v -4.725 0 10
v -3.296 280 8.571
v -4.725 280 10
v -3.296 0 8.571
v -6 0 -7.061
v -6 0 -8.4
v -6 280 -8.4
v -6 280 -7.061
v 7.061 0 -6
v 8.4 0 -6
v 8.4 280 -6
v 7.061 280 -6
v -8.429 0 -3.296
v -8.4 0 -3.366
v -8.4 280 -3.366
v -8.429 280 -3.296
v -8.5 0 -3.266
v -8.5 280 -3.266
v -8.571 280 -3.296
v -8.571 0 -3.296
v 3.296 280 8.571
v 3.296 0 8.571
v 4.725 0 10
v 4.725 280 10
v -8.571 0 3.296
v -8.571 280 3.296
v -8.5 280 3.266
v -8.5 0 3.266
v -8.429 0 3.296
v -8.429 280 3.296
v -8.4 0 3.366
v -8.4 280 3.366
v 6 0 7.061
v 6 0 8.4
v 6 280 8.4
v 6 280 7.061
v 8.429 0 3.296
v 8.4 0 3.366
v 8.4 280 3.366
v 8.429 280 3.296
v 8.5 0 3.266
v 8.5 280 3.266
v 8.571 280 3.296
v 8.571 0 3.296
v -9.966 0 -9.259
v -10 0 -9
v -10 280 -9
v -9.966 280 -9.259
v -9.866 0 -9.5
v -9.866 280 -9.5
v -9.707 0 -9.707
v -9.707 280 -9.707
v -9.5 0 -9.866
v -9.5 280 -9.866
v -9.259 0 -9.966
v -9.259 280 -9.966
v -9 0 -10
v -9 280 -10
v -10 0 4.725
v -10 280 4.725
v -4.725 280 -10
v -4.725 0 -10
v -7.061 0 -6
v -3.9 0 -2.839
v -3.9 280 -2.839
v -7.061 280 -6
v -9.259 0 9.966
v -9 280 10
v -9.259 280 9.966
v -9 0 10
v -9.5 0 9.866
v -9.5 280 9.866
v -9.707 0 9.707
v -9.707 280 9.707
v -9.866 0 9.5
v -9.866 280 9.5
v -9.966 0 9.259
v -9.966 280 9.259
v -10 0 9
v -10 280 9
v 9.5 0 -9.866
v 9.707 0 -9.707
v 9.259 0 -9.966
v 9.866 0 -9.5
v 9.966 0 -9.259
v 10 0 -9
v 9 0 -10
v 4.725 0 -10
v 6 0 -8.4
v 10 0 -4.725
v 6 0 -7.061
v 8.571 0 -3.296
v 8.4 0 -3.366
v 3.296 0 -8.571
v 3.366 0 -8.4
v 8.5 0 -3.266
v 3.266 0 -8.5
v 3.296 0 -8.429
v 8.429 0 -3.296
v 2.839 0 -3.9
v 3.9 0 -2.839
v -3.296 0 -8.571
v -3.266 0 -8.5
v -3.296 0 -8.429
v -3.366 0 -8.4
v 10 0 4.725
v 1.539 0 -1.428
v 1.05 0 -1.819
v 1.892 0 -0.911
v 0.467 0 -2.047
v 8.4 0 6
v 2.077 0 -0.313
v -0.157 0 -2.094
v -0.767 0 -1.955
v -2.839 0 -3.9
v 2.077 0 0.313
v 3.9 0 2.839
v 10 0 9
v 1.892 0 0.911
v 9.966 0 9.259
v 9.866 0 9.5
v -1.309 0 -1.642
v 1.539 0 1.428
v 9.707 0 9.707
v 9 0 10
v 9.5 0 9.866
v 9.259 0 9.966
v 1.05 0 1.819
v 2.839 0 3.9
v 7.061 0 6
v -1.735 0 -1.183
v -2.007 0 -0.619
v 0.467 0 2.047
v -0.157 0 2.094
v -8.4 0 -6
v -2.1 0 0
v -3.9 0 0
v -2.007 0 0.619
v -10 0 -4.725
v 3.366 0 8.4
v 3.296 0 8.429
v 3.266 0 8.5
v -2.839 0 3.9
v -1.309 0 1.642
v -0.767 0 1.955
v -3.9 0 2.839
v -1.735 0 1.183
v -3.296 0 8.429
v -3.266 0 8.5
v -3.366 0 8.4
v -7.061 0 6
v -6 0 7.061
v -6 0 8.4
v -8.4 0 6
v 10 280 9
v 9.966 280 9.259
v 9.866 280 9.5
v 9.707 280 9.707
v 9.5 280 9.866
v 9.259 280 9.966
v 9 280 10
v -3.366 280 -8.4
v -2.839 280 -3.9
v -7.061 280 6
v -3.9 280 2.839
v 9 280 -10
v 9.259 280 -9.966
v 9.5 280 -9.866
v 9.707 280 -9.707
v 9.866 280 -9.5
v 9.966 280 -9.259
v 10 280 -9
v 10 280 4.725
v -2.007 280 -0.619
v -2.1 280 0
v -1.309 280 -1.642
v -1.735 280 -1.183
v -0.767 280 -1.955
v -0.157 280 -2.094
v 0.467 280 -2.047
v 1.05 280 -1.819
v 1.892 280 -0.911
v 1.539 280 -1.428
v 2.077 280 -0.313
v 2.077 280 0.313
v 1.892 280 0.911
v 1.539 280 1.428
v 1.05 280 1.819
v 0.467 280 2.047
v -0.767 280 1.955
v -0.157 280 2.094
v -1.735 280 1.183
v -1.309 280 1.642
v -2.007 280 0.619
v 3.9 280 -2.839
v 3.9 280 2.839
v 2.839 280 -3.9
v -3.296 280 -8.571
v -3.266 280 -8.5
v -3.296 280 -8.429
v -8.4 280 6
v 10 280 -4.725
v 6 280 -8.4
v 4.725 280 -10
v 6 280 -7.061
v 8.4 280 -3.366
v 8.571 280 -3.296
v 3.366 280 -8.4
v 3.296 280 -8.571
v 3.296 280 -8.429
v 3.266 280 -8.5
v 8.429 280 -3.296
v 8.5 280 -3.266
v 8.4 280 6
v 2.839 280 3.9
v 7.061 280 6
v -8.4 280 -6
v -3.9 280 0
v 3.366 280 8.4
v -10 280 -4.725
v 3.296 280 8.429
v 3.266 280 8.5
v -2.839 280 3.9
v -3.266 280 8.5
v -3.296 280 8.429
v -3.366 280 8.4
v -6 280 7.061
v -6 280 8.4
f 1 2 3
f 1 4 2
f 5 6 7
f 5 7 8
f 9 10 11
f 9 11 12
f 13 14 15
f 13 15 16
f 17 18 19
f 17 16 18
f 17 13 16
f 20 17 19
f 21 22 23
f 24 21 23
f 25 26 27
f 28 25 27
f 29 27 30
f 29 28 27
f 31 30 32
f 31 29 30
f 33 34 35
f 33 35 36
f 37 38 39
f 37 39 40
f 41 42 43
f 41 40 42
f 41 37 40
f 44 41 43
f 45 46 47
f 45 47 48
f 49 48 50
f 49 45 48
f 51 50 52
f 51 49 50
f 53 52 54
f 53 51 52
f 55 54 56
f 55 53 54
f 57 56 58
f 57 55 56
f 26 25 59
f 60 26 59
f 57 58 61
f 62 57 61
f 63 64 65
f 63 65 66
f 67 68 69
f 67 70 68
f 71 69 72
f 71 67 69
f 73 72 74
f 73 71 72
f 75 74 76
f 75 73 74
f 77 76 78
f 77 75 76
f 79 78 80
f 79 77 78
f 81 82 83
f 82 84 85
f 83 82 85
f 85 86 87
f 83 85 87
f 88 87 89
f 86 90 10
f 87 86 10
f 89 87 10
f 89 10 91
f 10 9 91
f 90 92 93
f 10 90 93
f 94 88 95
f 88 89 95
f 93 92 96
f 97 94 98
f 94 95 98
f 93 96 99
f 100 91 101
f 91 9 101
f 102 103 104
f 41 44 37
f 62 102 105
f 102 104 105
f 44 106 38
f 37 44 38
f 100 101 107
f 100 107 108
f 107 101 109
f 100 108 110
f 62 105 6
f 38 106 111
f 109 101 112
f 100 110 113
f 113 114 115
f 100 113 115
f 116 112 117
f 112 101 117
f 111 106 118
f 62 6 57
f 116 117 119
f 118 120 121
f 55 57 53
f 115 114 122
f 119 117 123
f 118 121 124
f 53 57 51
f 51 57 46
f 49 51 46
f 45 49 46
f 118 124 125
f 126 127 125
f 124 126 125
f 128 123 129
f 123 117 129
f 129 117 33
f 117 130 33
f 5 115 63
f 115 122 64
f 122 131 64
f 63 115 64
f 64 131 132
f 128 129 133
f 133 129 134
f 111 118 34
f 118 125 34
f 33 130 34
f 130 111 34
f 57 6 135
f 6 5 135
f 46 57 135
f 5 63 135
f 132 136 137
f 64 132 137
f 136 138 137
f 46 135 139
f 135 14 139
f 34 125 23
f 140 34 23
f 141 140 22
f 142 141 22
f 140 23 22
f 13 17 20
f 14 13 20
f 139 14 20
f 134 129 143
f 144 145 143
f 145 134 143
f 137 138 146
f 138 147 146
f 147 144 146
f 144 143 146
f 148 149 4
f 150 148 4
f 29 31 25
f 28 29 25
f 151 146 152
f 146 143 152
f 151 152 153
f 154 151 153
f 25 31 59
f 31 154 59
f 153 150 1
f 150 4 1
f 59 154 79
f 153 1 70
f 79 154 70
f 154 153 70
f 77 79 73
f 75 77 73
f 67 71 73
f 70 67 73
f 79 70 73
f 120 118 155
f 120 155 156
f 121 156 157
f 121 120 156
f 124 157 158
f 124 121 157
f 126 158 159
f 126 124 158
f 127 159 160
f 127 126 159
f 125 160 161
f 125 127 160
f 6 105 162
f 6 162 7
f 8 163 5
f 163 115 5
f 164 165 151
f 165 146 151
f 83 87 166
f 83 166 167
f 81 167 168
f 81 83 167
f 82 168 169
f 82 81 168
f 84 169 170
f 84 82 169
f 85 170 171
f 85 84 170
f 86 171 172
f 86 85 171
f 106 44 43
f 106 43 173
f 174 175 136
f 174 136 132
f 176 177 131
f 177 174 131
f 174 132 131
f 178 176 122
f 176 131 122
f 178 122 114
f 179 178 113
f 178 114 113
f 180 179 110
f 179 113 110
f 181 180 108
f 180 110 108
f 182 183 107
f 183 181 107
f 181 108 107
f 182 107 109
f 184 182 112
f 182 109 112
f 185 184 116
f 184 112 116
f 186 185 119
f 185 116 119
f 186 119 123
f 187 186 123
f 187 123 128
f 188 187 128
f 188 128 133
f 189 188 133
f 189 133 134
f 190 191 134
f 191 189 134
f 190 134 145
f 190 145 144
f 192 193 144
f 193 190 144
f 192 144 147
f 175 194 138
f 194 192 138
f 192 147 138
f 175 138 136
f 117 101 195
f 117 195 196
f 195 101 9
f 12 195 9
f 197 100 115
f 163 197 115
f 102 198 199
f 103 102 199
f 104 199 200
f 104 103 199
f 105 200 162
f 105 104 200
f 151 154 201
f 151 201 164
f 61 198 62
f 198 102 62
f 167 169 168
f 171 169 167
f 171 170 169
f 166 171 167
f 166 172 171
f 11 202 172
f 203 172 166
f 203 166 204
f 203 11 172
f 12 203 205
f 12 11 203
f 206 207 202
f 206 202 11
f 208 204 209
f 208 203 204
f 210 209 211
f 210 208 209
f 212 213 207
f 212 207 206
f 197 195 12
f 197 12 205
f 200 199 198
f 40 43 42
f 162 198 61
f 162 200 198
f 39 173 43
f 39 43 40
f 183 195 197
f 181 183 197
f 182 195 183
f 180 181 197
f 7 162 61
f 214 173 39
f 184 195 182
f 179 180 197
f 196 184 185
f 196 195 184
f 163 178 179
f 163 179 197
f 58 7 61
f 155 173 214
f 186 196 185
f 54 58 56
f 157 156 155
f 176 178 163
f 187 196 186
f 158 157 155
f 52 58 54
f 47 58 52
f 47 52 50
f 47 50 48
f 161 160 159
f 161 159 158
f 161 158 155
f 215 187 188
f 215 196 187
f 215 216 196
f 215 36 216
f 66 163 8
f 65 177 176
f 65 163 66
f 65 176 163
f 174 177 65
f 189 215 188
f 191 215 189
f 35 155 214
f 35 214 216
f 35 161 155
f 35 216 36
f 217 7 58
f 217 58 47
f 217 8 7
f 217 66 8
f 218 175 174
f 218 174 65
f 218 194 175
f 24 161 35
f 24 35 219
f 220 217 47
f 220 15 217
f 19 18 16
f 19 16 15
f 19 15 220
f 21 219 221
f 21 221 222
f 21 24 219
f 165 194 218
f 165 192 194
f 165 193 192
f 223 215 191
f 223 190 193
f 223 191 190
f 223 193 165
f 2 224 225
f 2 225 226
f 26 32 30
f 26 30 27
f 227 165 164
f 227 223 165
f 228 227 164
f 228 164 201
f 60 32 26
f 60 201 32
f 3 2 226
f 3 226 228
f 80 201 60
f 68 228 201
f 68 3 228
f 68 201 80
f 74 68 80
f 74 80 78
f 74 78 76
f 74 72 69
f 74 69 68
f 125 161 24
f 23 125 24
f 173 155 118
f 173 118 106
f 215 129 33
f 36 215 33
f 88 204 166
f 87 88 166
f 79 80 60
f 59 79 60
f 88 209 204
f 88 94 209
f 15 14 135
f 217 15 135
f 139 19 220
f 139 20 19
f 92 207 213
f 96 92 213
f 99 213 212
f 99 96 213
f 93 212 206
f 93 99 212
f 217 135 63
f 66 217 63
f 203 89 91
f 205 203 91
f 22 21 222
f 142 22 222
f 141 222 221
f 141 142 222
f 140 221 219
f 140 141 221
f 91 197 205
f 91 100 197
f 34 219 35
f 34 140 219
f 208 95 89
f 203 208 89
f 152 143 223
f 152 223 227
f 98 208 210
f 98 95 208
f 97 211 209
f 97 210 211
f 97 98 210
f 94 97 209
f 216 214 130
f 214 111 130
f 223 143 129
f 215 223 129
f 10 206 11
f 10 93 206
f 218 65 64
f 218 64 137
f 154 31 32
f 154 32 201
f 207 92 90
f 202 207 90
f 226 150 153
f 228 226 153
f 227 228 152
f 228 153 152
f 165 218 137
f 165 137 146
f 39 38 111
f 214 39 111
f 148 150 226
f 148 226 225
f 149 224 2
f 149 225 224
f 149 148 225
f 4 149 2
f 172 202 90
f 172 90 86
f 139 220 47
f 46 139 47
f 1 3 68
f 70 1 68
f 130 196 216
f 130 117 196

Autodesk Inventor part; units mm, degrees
ref_plane "YZ Plane" through (0, 0, 0) normal (1, 0, 0) x (0, 1, 0)
ref_plane "XZ Plane" through (0, 0, 0) normal (0, 1, 0) x (-1, 0, 0)
ref_plane "XY Plane" through (0, 0, 0) normal (0, 0, 1) x (1, 0, 0)
sketch "Sketch1" plane through (0, 0, 0) normal (0, 1, 0) x (-1, 0, 0)
  line L0 (3.9, -2.8393) -> (3.9, 2.8393)
  line L1 (2.8393, 3.9) -> (-2.8393, 3.9)
  line L2 (-2.8393, -3.9) -> (2.8393, -3.9)
  line L3 (8.5707, 3.2957) -> (10, 4.725)
  line L4 (8.5707, -3.2957) -> (10, -4.725)
  line L5 (8.4, 3.3664) -> (8.4, 6)
  line L6 (8.4, 6) -> (7.0607, 6)
  line L7 (10, 9) -> (10, 4.725)
  line L8 (10, -4.725) -> (10, -9)
  line L9 (3.9, 2.8393) -> (7.0607, 6)
  line L10 (3.2957, 8.5707) -> (4.725, 10)
  line L11 (3.3664, 8.4) -> (6, 8.4)
  line L12 (6, 8.4) -> (6, 7.0607)
  line L13 (2.8393, 3.9) -> (6, 7.0607)
  line L14 (3.9, 0) -> (8.4, 0)
  line L15 (8.4, -3.3664) -> (8.4, -6)
  line L16 (8.4, -6) -> (7.0607, -6)
  line L17 (3.9, -2.8393) -> (7.0607, -6)
  line L18 (3.2957, -8.5707) -> (4.725, -10)
  line L19 (3.3664, -8.4) -> (6, -8.4)
  line L20 (6, -8.4) -> (6, -7.0607)
  line L21 (2.8393, -3.9) -> (6, -7.0607)
  line L22 (-3.9, -2.8393) -> (-3.9, 2.8393)
  line L23 (-8.5707, 3.2957) -> (-10, 4.725)
  line L24 (-8.5707, -3.2957) -> (-10, -4.725)
  line L25 (-8.4, 3.3664) -> (-8.4, 6)
  line L26 (-8.4, 6) -> (-7.0607, 6)
  line L27 (-10, 9) -> (-10, 4.725)
  line L28 (-10, -4.725) -> (-10, -9)
  line L29 (-3.9, 2.8393) -> (-7.0607, 6)
  line L30 (-3.2957, 8.5707) -> (-4.725, 10)
  line L31 (-3.3664, 8.4) -> (-6, 8.4)
  line L32 (-6, 8.4) -> (-6, 7.0607)
  line L33 (-2.8393, 3.9) -> (-6, 7.0607)
  line L34 (-3.9, -2.8393) -> (-7.0607, -6)
  line L35 (-8.4, -6) -> (-7.0607, -6)
  line L36 (-8.4, -3.3664) -> (-8.4, -6)
  line L37 (-2.8393, -3.9) -> (-6, -7.0607)
  line L38 (-6, -8.4) -> (-6, -7.0607)
  line L39 (-3.3664, -8.4) -> (-6, -8.4)
  line L40 (-3.2957, -8.5707) -> (-4.725, -10)
  line L41 (-9, 10) -> (-4.725, 10)
  line L42 (4.725, 10) -> (9, 10)
  line L43 (9, -10) -> (4.725, -10)
  line L44 (-4.725, -10) -> (-9, -10)
  circle A0 centre (0, 0) radius 2.1
  arc A1 (10, 9) -> (9, 10) centre (9, 9) ccw
  arc A2 (9, -10) -> (10, -9) centre (9, -9) ccw
  arc A3 (-10, -9) -> (-9, -10) centre (-9, -9) ccw
  arc A4 (-9, 10) -> (-10, 9) centre (-9, 9) ccw
  arc A5 (8.4, 3.3664) -> (8.5707, 3.2957) centre (8.5, 3.3664) ccw
  arc A6 (3.2957, 8.5707) -> (3.3664, 8.4) centre (3.3664, 8.5) ccw
  arc A7 (8.5707, -3.2957) -> (8.4, -3.3664) centre (8.5, -3.3664) ccw
  arc A8 (3.3664, -8.4) -> (3.2957, -8.5707) centre (3.3664, -8.5) ccw
  arc A9 (-3.2957, -8.5707) -> (-3.3664, -8.4) centre (-3.3664, -8.5) ccw
  arc A10 (-8.4, -3.3664) -> (-8.5707, -3.2957) centre (-8.5, -3.3664) ccw
  arc A11 (-8.5707, 3.2957) -> (-8.4, 3.3664) centre (-8.5, 3.3664) ccw
  arc A12 (-3.3664, 8.4) -> (-3.2957, 8.5707) centre (-3.3664, 8.5) ccw
  dimension "d11" = 1
extrude "Extrusion1" add sketch "Sketch1" along normal blind 280
properties part number "VSLOT20x20x280"
